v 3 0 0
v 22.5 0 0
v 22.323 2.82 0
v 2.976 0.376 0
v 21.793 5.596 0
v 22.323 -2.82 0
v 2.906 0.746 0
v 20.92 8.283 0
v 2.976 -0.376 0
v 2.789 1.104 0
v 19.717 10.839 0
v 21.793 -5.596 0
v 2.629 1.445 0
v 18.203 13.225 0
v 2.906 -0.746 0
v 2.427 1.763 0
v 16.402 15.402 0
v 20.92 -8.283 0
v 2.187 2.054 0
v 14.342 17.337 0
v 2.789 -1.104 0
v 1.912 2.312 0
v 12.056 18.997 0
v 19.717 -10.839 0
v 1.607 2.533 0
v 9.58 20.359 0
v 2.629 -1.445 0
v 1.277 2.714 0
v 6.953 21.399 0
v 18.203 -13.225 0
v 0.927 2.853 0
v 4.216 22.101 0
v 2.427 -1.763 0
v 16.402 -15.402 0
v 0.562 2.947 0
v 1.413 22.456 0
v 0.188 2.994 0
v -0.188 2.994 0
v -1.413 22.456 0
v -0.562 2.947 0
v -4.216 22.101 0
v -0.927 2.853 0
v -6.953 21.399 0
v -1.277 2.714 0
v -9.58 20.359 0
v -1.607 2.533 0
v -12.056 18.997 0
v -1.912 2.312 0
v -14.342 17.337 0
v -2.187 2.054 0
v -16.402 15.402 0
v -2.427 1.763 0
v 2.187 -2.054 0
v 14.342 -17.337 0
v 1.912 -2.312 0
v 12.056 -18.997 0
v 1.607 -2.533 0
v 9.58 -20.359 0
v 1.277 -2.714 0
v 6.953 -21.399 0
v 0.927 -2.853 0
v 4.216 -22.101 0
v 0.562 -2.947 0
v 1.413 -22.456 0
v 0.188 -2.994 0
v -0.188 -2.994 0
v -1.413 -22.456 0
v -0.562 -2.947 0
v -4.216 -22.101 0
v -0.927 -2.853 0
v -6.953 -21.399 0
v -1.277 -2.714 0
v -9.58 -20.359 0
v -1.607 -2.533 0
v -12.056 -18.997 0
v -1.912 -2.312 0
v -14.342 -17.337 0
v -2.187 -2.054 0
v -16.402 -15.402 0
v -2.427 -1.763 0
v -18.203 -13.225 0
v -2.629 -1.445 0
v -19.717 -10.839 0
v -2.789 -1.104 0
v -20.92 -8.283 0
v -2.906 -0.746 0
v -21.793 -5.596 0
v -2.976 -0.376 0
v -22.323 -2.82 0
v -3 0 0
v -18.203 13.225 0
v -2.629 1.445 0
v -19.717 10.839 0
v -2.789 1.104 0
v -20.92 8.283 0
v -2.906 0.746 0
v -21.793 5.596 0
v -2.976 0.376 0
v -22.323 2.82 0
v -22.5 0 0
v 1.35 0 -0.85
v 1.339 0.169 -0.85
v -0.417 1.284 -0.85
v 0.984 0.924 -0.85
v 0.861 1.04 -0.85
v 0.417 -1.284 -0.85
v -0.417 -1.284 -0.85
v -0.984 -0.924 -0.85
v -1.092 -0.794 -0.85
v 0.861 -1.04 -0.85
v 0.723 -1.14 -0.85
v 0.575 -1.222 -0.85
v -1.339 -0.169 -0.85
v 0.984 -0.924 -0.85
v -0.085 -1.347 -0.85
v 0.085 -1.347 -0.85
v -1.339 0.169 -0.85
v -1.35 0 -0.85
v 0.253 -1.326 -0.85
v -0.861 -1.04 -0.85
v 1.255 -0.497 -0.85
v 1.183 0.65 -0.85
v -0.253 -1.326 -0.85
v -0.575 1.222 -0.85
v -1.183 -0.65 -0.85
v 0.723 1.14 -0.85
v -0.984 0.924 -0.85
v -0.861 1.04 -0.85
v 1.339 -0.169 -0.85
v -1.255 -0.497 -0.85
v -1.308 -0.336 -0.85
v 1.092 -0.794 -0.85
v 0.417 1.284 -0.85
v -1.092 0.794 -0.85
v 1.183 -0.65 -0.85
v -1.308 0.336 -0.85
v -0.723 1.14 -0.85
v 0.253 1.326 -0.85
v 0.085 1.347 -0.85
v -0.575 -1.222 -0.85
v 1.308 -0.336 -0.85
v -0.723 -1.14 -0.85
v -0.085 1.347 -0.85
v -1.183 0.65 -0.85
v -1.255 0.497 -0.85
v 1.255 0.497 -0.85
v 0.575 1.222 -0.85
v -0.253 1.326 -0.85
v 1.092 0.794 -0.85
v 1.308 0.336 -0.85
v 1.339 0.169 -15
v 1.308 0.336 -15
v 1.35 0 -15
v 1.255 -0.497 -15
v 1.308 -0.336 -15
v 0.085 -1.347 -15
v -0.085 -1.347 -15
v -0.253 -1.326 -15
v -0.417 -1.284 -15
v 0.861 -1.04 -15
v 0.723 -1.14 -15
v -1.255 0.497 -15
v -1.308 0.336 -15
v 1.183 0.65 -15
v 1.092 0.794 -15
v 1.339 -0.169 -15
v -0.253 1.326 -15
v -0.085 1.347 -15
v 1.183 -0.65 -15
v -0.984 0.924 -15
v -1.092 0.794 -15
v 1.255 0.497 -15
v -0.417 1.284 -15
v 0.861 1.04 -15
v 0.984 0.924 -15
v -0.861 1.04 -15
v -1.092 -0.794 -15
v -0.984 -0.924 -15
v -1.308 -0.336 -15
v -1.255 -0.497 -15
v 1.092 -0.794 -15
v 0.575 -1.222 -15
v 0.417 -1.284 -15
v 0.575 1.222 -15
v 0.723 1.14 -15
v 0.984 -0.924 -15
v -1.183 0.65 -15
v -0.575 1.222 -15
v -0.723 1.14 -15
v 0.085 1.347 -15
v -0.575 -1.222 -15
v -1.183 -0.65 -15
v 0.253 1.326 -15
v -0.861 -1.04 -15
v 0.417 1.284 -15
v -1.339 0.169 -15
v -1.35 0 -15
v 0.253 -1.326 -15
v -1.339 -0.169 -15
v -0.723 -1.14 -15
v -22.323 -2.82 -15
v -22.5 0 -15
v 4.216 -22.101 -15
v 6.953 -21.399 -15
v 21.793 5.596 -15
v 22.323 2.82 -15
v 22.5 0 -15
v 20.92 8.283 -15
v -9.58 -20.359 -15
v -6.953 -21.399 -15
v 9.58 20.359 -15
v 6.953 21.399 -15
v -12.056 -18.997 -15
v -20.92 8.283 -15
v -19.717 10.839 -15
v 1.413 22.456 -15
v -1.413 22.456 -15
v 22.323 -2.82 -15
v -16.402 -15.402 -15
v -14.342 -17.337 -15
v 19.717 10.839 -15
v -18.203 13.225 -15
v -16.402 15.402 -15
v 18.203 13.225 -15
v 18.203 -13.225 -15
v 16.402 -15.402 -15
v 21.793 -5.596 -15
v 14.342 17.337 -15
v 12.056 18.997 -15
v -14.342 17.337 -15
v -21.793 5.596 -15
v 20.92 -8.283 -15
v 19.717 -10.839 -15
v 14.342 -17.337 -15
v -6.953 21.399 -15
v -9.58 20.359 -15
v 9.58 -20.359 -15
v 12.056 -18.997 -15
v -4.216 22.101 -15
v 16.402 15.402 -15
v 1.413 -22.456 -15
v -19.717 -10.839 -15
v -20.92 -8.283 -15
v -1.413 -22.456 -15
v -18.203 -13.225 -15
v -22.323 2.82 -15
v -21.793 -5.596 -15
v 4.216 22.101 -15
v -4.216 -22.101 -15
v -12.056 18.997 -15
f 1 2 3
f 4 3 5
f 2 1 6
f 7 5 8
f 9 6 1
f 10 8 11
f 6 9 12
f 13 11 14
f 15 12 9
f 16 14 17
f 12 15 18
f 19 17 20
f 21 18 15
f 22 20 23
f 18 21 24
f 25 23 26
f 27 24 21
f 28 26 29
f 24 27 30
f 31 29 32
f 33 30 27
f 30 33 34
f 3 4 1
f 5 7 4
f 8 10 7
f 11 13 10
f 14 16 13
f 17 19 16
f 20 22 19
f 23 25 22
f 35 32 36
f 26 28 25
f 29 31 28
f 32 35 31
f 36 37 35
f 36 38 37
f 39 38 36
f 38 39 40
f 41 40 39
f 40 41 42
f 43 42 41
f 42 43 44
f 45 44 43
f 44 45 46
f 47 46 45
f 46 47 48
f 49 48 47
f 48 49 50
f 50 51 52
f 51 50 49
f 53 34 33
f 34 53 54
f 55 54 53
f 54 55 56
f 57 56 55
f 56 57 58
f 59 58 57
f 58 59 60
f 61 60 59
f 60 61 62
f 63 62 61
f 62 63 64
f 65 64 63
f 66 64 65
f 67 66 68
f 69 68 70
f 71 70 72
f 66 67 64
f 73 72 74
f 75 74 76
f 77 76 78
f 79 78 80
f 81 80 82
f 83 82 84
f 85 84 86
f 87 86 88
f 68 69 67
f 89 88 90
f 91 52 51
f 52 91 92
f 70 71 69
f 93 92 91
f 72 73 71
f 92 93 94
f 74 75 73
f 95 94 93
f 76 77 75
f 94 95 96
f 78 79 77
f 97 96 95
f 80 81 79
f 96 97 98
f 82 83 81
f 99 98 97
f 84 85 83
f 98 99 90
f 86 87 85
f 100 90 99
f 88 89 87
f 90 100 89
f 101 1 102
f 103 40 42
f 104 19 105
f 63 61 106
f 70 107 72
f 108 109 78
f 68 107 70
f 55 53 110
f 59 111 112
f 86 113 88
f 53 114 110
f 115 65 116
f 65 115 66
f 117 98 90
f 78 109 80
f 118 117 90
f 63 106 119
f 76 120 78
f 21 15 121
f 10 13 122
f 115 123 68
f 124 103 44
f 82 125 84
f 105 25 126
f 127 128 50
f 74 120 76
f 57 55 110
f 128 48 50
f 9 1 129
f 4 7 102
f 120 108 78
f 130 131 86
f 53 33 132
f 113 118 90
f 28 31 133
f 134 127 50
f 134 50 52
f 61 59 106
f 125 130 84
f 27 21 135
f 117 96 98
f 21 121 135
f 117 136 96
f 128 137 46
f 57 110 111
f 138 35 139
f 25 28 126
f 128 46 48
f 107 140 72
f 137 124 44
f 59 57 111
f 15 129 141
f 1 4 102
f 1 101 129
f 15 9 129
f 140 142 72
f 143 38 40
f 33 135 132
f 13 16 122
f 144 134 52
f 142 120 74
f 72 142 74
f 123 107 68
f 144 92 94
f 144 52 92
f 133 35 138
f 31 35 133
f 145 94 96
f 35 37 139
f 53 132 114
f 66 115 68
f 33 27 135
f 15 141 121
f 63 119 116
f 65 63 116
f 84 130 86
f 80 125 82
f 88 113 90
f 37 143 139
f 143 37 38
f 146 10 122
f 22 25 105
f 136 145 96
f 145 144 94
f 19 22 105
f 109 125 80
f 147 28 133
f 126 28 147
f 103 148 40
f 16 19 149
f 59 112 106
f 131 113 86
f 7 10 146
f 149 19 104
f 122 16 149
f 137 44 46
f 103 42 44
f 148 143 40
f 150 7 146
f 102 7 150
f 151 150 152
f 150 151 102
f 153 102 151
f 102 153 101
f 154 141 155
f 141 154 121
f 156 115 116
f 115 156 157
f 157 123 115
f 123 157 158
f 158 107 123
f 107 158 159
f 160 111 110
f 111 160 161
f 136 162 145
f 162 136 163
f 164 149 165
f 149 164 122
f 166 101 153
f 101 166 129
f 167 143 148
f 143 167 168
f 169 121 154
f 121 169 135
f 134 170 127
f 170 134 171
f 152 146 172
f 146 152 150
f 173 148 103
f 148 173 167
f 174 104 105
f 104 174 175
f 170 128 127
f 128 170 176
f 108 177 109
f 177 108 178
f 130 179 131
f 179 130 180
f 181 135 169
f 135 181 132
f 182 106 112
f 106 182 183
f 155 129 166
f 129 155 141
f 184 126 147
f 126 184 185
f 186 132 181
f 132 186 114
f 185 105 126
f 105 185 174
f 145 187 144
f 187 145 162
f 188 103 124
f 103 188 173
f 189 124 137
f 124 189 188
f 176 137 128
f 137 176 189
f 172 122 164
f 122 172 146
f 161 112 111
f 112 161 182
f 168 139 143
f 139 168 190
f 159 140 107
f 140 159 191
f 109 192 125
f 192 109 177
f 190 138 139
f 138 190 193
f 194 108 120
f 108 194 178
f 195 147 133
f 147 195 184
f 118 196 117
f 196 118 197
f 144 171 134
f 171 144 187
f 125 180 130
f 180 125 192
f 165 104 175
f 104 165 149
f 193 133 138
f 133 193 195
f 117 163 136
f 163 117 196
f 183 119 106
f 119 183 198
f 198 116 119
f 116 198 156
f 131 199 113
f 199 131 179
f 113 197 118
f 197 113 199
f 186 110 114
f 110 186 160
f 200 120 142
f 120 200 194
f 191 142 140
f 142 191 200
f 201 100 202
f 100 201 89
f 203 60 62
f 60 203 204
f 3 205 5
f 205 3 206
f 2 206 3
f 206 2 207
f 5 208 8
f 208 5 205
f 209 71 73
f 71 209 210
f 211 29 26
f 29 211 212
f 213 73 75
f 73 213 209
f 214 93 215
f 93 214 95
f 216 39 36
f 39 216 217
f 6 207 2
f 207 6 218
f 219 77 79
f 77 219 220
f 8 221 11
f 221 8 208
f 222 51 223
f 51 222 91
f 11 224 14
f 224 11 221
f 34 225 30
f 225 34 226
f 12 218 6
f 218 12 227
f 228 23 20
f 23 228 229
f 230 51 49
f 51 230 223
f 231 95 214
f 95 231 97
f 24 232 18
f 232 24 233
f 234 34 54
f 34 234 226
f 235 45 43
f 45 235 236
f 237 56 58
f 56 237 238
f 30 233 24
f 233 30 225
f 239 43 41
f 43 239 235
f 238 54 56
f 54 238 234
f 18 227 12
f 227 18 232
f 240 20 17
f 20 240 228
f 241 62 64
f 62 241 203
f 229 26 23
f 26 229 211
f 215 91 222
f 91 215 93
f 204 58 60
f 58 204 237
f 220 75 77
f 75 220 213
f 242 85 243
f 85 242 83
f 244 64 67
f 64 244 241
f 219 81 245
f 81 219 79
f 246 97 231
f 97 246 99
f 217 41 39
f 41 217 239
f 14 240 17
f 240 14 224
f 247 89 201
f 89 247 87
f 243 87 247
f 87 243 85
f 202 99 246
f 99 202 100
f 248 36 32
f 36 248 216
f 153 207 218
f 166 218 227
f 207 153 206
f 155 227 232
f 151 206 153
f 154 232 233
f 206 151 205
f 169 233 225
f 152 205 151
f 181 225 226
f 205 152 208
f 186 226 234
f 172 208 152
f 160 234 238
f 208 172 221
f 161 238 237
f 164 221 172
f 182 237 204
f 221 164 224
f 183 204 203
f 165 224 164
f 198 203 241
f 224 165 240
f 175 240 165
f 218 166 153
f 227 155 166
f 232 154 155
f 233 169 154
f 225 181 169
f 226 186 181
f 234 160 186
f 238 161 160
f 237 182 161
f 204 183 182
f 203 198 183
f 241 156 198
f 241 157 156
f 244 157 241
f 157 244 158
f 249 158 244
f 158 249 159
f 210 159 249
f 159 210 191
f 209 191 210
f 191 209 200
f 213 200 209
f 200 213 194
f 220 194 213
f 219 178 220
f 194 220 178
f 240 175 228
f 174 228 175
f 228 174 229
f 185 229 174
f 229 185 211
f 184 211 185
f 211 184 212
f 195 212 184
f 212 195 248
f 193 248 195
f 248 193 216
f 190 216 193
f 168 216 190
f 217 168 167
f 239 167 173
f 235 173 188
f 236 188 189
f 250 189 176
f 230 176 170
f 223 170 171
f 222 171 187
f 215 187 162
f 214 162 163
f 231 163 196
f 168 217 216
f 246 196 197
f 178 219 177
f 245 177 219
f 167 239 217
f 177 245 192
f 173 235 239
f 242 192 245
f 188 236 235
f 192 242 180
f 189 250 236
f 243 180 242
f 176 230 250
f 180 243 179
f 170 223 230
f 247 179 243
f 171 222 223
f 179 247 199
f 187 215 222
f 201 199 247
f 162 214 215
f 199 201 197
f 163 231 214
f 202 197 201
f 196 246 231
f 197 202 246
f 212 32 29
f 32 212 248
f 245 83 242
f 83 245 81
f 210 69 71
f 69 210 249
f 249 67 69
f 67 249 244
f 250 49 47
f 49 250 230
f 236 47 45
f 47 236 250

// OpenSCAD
$fn = 50;


difference() {
	union() {
		translate(v = [0, 0, -15.0000000000]) {
			cylinder(h = 15, r = 22.5000000000);
		}
	}
	union() {
		translate(v = [0, 0, 0]) {
			rotate(a = [0, 0, 0]) {
				difference() {
					union() {
						translate(v = [0, 0, -18.0000000000]) {
							cylinder(h = 18, r = 1.0000000000);
						}
						translate(v = [0, 0, -0.8500000000]) {
							cylinder(h = 0.8500000000, r1 = 1.3500000000, r2 = 3.0000000000);
						}
						translate(v = [0, 0, -18.0000000000]) {
							cylinder(h = 18, r = 1.3500000000);
						}
						translate(v = [0, 0, -18.0000000000]) {
							cylinder(h = 18, r = 1.0000000000);
						}
					}
					union();
				}
			}
		}
	}
}
